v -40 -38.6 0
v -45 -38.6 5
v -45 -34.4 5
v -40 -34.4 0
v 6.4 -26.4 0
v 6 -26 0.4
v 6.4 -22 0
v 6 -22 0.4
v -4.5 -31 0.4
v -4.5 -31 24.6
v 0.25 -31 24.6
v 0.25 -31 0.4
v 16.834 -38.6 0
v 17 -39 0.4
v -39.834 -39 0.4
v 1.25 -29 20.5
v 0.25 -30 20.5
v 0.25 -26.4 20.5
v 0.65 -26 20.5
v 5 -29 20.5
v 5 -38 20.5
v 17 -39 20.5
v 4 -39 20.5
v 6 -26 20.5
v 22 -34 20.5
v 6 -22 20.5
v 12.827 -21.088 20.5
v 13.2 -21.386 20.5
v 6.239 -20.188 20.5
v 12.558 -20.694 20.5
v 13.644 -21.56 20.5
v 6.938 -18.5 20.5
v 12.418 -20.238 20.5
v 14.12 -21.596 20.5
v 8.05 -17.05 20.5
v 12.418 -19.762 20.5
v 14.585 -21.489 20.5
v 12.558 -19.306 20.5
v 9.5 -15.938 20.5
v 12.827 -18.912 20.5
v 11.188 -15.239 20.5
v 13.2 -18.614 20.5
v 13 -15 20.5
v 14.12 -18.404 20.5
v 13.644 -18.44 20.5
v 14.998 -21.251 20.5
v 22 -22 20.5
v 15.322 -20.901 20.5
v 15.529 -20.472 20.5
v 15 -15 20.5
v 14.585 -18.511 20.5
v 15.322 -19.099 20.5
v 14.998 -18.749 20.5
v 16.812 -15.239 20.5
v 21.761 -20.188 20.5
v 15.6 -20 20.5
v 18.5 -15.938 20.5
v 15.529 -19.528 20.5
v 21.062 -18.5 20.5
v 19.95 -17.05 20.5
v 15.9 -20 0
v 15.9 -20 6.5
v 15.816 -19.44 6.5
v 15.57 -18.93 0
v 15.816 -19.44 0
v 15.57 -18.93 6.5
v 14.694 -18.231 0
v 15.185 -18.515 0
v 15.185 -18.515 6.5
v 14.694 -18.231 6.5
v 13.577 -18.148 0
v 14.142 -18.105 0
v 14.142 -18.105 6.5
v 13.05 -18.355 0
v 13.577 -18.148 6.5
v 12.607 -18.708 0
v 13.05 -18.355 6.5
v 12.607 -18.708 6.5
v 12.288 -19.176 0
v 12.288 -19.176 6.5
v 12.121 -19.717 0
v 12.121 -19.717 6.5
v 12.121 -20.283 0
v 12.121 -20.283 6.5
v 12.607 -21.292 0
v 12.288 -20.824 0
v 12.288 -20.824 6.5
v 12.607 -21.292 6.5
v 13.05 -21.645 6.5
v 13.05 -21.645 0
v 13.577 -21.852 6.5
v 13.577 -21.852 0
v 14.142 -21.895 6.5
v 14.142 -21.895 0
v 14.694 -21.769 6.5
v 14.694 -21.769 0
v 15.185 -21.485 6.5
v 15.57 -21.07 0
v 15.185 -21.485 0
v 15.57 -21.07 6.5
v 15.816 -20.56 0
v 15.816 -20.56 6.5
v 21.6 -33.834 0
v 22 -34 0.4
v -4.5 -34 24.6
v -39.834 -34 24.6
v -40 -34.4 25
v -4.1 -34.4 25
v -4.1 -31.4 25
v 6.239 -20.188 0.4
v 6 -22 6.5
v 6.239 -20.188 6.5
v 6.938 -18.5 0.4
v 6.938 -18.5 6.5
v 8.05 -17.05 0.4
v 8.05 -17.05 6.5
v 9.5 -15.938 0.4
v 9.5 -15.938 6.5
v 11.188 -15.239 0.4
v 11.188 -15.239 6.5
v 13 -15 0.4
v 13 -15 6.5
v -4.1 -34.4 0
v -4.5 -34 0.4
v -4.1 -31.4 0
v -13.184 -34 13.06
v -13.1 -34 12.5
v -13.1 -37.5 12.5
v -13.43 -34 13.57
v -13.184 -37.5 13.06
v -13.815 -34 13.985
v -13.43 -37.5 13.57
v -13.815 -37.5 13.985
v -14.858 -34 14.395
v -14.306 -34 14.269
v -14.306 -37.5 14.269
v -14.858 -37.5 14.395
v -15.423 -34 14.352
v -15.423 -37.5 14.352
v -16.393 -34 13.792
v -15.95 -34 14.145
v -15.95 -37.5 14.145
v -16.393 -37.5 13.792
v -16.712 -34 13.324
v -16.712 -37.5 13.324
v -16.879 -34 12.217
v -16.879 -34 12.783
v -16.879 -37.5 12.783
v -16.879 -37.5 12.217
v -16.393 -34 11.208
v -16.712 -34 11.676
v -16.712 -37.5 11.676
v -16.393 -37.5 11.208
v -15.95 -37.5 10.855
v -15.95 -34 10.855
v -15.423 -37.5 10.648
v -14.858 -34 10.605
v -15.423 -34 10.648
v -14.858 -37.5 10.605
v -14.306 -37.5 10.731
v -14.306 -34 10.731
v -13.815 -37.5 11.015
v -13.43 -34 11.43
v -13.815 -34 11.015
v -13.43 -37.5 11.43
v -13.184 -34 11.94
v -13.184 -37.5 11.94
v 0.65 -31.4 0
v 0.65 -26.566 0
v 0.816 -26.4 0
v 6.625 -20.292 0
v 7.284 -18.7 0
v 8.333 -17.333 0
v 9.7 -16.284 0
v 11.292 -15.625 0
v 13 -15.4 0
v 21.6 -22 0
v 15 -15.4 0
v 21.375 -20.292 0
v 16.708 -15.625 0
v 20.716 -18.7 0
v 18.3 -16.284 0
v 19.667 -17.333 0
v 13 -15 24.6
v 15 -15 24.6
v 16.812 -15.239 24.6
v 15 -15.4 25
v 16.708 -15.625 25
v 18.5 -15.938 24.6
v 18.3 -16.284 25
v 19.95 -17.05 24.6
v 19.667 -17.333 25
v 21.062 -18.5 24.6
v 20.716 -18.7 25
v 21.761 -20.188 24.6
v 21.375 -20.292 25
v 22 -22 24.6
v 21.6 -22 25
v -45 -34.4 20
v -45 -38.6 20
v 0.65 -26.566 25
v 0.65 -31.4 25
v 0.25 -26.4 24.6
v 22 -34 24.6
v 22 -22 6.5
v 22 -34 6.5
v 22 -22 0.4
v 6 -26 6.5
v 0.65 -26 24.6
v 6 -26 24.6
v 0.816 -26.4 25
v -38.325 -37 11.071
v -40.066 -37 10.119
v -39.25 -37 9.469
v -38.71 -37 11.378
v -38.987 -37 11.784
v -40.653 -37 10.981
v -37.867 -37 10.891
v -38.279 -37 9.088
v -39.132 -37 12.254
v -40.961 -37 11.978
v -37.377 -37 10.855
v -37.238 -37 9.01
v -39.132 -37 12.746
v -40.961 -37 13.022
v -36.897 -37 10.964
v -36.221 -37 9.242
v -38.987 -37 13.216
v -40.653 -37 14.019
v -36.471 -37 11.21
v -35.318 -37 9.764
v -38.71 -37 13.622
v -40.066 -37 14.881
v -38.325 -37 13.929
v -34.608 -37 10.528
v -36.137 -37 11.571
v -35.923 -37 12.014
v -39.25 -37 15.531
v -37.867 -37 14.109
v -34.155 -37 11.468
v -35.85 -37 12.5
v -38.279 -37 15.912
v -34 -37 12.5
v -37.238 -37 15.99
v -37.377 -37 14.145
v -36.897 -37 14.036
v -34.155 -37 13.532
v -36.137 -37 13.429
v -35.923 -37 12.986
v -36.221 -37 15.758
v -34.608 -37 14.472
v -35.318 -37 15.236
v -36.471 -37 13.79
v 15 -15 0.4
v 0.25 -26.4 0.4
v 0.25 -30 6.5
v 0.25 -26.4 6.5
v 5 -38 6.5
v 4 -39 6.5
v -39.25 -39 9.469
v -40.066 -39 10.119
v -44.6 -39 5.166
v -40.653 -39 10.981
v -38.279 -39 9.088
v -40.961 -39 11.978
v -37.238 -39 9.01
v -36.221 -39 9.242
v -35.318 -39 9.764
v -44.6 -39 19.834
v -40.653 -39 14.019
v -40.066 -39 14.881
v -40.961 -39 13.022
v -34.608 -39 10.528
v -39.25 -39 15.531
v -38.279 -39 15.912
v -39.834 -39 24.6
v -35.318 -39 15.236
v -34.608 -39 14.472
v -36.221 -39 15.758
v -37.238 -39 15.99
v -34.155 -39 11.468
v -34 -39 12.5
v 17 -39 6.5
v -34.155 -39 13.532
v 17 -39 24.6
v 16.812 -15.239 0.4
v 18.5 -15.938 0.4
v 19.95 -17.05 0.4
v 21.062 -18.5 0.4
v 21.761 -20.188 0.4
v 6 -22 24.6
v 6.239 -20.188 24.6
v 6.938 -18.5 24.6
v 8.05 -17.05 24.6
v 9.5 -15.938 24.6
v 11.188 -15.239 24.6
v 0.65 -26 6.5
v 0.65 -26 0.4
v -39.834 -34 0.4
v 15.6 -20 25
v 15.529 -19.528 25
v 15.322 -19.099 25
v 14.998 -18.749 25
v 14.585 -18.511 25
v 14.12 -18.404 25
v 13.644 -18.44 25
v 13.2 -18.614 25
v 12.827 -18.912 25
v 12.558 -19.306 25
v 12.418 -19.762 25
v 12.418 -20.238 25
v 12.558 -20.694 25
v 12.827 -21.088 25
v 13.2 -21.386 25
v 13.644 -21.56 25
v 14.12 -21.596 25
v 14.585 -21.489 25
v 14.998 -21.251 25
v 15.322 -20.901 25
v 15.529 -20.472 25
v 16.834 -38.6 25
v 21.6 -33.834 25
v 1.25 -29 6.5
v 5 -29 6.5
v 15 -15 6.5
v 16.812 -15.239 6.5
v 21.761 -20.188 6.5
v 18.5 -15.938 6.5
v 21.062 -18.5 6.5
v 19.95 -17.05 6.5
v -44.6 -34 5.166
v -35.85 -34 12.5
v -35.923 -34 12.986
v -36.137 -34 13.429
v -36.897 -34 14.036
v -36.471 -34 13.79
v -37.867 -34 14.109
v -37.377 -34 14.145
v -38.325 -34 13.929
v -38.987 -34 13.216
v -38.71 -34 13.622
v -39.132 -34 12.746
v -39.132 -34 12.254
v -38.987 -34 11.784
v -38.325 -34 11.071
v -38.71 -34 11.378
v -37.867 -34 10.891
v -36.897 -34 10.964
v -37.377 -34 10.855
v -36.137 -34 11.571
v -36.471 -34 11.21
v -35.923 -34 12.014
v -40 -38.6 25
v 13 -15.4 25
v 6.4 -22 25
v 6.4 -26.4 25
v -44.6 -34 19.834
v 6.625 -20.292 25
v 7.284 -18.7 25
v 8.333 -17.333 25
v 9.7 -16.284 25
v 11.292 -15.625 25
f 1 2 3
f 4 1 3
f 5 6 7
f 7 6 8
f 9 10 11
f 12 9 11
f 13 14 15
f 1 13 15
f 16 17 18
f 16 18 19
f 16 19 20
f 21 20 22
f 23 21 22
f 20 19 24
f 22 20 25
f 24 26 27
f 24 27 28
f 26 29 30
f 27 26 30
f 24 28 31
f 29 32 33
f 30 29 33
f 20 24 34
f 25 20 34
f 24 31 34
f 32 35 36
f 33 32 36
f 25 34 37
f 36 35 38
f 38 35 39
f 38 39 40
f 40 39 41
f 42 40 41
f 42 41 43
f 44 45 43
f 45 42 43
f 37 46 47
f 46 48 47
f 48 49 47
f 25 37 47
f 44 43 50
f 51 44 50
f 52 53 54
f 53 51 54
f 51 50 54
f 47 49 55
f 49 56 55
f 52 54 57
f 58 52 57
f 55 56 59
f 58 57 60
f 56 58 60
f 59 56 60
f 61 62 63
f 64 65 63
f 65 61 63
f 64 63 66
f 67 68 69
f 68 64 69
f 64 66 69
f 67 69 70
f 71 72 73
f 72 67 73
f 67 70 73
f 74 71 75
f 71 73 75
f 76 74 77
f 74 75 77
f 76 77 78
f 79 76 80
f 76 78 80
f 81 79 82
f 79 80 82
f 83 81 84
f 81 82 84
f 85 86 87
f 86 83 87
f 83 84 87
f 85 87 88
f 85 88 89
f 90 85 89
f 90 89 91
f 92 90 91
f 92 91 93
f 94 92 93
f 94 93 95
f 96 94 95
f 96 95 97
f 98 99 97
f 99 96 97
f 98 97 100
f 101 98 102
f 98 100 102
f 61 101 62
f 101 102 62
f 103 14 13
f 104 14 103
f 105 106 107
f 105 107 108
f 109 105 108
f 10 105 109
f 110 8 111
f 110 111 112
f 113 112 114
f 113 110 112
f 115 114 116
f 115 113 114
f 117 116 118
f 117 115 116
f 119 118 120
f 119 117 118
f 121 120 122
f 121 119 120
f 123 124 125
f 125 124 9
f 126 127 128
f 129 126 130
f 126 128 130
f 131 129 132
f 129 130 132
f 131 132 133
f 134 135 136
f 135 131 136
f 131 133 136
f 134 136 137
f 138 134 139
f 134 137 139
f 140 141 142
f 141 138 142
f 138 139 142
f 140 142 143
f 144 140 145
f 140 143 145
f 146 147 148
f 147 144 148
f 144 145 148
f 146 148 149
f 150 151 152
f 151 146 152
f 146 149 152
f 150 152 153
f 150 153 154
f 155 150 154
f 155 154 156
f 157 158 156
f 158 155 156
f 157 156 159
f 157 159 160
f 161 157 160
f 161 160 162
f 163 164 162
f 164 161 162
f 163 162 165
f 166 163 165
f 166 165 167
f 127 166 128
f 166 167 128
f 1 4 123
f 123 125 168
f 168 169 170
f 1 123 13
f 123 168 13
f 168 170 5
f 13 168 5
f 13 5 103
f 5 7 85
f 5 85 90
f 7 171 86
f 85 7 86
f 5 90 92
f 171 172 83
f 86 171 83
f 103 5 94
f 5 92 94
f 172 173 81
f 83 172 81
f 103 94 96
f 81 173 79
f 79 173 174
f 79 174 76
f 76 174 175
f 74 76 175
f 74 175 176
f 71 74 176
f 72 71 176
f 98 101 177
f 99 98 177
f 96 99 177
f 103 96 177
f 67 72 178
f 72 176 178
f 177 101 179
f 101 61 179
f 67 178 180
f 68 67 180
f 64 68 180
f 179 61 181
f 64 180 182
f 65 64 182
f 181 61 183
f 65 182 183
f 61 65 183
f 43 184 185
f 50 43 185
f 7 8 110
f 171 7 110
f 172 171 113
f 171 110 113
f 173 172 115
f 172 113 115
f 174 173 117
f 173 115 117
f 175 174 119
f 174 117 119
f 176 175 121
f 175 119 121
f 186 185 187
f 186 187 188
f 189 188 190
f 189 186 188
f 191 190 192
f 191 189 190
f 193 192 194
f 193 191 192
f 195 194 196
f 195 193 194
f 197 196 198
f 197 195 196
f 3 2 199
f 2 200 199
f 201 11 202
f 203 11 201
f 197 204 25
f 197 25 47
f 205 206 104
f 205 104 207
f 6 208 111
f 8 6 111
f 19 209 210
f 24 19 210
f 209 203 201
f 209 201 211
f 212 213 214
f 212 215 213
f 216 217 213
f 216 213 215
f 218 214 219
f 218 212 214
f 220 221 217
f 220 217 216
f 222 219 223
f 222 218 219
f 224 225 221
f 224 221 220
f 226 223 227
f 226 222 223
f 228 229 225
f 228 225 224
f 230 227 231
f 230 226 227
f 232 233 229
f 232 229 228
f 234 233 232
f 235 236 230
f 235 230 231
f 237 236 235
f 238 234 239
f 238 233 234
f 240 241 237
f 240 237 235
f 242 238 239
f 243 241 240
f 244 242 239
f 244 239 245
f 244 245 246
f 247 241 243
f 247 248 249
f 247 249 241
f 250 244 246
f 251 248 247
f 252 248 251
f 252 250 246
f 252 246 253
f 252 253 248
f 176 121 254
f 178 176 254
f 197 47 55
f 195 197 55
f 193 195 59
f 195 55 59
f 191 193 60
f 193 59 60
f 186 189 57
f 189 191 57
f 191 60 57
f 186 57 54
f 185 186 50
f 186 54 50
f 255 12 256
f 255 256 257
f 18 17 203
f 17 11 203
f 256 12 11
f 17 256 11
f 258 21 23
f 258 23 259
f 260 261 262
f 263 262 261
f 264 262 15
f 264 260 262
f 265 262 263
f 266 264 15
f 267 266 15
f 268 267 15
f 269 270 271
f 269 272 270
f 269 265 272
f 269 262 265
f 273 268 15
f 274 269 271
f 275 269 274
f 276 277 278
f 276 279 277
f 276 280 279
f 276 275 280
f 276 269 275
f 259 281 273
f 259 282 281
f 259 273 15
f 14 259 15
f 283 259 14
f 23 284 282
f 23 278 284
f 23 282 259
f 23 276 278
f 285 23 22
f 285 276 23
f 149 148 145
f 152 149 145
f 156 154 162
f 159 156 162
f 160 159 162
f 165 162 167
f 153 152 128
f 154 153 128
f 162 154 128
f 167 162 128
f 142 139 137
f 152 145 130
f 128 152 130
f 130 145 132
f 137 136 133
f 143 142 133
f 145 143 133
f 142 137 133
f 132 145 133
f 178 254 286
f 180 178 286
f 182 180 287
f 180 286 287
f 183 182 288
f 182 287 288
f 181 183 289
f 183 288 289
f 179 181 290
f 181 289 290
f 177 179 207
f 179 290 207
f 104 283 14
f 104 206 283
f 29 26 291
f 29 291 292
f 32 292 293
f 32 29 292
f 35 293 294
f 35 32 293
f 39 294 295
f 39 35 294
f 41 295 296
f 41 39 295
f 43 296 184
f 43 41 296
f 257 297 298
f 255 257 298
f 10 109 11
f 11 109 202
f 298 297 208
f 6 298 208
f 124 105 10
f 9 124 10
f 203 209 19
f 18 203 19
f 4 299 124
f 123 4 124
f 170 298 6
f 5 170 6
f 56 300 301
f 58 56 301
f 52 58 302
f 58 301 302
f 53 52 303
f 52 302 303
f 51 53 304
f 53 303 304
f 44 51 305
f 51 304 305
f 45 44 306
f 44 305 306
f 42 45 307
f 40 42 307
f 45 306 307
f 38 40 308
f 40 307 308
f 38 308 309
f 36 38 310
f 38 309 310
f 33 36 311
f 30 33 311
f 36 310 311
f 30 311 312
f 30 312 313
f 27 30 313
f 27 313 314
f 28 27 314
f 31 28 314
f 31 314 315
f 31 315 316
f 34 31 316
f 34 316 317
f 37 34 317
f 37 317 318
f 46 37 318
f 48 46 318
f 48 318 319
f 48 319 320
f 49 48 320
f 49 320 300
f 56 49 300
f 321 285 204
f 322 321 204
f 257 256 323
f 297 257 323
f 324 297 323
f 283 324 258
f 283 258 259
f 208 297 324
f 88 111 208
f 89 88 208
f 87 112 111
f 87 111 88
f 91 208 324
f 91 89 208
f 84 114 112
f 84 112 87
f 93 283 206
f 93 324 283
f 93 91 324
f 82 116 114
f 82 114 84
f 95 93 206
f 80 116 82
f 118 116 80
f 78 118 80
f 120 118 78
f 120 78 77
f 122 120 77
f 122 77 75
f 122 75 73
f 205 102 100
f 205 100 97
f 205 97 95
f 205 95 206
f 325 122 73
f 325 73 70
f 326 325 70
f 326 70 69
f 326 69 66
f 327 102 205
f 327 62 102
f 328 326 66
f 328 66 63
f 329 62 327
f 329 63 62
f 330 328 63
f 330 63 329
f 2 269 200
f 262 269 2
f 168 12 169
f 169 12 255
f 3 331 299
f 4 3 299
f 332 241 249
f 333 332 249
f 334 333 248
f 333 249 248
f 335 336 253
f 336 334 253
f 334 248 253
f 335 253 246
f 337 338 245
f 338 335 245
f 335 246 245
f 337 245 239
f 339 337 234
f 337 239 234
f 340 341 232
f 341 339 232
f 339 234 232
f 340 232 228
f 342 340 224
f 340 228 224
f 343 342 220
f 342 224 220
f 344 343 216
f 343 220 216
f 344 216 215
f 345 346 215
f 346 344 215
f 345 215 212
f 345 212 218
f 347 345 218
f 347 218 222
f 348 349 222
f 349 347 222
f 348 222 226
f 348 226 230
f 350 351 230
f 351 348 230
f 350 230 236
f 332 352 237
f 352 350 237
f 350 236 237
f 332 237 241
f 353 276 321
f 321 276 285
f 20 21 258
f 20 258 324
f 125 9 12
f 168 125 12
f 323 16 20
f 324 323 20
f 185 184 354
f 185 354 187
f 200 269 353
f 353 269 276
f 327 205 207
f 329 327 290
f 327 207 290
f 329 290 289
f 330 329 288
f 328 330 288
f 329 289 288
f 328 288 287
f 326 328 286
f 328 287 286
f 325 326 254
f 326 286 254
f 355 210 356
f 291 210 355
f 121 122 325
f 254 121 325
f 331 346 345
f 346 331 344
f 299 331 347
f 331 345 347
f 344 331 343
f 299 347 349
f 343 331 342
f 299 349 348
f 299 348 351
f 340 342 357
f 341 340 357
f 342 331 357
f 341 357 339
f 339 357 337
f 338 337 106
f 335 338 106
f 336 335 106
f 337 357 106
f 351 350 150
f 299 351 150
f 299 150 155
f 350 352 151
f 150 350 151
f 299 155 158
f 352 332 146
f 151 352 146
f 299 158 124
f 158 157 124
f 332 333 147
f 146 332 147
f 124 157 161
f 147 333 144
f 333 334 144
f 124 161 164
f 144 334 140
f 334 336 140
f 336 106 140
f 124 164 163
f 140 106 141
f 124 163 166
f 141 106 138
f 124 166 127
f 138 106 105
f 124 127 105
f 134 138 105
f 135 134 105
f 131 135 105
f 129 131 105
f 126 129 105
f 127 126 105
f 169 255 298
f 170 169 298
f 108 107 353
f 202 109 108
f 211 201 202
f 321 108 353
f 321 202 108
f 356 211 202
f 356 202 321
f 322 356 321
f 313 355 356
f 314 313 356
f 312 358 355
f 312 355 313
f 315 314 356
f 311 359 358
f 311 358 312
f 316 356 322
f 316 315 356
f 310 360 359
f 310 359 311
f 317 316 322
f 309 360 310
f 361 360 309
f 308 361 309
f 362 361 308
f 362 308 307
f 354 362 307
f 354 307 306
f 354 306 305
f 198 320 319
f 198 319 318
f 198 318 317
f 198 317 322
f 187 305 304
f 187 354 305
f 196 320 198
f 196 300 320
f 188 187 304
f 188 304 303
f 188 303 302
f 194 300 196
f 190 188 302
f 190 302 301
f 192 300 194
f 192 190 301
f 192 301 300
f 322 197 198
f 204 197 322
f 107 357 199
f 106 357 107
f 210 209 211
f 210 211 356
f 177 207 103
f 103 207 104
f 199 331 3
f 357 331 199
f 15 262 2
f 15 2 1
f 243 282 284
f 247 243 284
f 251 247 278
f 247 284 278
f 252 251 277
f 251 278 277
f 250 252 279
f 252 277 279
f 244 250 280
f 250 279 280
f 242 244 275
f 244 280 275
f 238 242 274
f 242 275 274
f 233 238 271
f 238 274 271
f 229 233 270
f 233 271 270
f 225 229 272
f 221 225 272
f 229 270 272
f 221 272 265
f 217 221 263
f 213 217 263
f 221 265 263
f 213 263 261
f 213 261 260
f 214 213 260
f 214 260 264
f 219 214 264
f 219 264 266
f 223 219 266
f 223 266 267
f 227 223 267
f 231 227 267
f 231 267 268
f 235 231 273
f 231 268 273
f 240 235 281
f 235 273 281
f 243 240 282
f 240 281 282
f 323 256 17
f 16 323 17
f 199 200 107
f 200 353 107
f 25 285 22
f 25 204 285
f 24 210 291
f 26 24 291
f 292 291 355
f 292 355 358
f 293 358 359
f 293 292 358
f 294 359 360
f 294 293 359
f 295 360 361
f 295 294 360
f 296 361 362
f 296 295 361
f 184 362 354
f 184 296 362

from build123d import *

# Parameters (mm, degrees)
BOX044_W                                   = 19
BOX044_H                                   = 29
BOX044_DEPTH                               = 14
BOX043_W                                   = 23
BOX043_H                                   = 10
BOX043_DEPTH                               = 14
CYLINDER012_R                              = 1.9
CYLINDER012_DEPTH                          = 10
CYLINDER014_R                              = 3.5
CYLINDER014_DEPTH                          = 2
CYLINDER013_R                              = 1.65
CYLINDER013_DEPTH                          = 10
CYLINDER010_R                              = 1.6
CYLINDER010_DEPTH                          = 18
CYLINDER011_R                              = 1.9
CYLINDER011_DEPTH                          = 18
BOX015_W                                   = 5.75
BOX015_H                                   = 13
BOX015_DEPTH                               = 25
CHAMFER016016006_SIZE                      = 0.4
BOX009_W                                   = 16
BOX009_H                                   = 24
BOX009_DEPTH                               = 4.5
FILLET001_R                                = 7
CHAMFER011_SIZE                            = 5
BOX010_W                                   = 16
BOX010_H                                   = 24
BOX010_DEPTH                               = 6.5
FILLET002_R                                = 7
CHAMFER009_SIZE                            = 5
BOX012_W                                   = 43.5
BOX012_H                                   = 8
BOX012_DEPTH                               = 25
BOX008_W                                   = 52
BOX008_H                                   = 8
BOX008_DEPTH                               = 25
CHAMFER016016004_SIZE                      = 5
BOX011_W                                   = 21.75
BOX011_H                                   = 13
BOX011_DEPTH                               = 14
CHAMFER016016005_SIZE                      = 5
CHAMFER016016007_SIZE                      = 0.4
CHAMFER016016008004017002013005003_SIZE    = 1
CHAMFER016016008004017002013005004_SIZE    = 1
CHAMFER016016008004017002013005004002_SIZE = 0.4


with BuildPart() as cube044:
    # Box044 → Box044 (new body)
    with BuildSketch(Plane(origin=(5, -40.5, -20.5), x_dir=(1, 0, 0), z_dir=(0, 0, 1))):
        with Locations((9.5, 14.5)):
            Rectangle(BOX044_W, BOX044_H)
    extrude(amount=BOX044_DEPTH)


with BuildPart() as cube043:
    # Box043 → Box043 (new body)
    with BuildSketch(Plane(origin=(0, -29, -20.5), x_dir=(1, 0, 0), z_dir=(0, 0, 1))):
        with Locations((11.5, 5)):
            Rectangle(BOX043_W, BOX043_H)
    extrude(amount=BOX043_DEPTH)


with BuildPart() as cylinder012:
    # Cylinder012 → Cylinder012 (new body)
    with BuildSketch(Plane(origin=(-15, -37.5, -12.5), x_dir=(1, 0, 0), z_dir=(0, 1, 0))):
        Circle(CYLINDER012_R)
    extrude(amount=CYLINDER012_DEPTH)


with BuildPart() as cylinder014:
    # Cylinder014 → Cylinder014 (new body)
    with BuildSketch(Plane(origin=(-37.5, -39, -12.5), x_dir=(1, 0, 0), z_dir=(0, 1, 0))):
        Circle(CYLINDER014_R)
    extrude(amount=CYLINDER014_DEPTH)


with BuildPart() as fusion011:
    # Cylinder013 → Cylinder013 (new body)
    with BuildSketch(Plane(origin=(-37.5, -41.5, -12.5), x_dir=(1, 0, 0), z_dir=(0, 1, 0))):
        Circle(CYLINDER013_R)
    extrude(amount=CYLINDER013_DEPTH)

    # Fusion011: union Cylinder012, Cylinder014
    add(cylinder012.part)
    add(cylinder014.part)


with BuildPart() as cylinder010:
    # Cylinder010 → Cylinder010 (new body)
    with BuildSketch(Plane(origin=(10, -20, -30), x_dir=(1, 0, 0), z_dir=(0, 0, 1))):
        Circle(CYLINDER010_R)
    extrude(amount=CYLINDER010_DEPTH)


with BuildPart() as fusion010:
    # Cylinder011 → Cylinder011 (new body)
    with BuildSketch(Plane(origin=(10, -20, -11), x_dir=(1, 0, 0), z_dir=(0, 0, 1))):
        Circle(CYLINDER011_R)
    extrude(amount=CYLINDER011_DEPTH)

    # Fusion010: union Cylinder010
    add(cylinder010.part)


with BuildPart() as fusion010_1:
    # Fusion010 placement: moved
    add(fusion010.part.moved(Location((4, 0, 0))))


with BuildPart() as chamfer016016006:
    # Box015 → Box015 (new body)
    with BuildSketch(Plane(origin=(0.25, -39, -25), x_dir=(1, 0, 0), z_dir=(0, 0, 1))):
        with Locations((2.875, 6.5)):
            Rectangle(BOX015_W, BOX015_H)
    extrude(amount=BOX015_DEPTH)

    # Chamfer016016006
    chamfer016016006_edges = [chamfer016016006.edges().sort_by_distance(p)[0] for p in [
        (0.25, -26, -12.5),
    ]]
    chamfer(chamfer016016006_edges, length=CHAMFER016016006_SIZE)


with BuildPart() as chamfer011:
    # Box009 → Box009 (new body)
    with BuildSketch(Plane(origin=(2, -39, -25), x_dir=(1, 0, 0), z_dir=(0, 0, 1))):
        with Locations((8, 12)):
            Rectangle(BOX009_W, BOX009_H)
    extrude(amount=BOX009_DEPTH)

    # Fillet001
    fillet001_edges = [chamfer011.edges().sort_by_distance(p)[0] for p in [
        (2, -15, -22.75),
        (18, -15, -22.75),
    ]]
    fillet(fillet001_edges, radius=FILLET001_R)

    # Chamfer011
    chamfer011_edges = [chamfer011.edges().sort_by_distance(p)[0] for p in [
        (18, -39, -22.75),
    ]]
    chamfer(chamfer011_edges, length=CHAMFER011_SIZE)


with BuildPart() as chamfer011_1:
    # Chamfer011 placement: moved
    add(chamfer011.part.moved(Location((4, 0, 0))))


with BuildPart() as chamfer009:
    # Box010 → Box010 (new body)
    with BuildSketch(Plane(origin=(2, -39, -6.5), x_dir=(1, 0, 0), z_dir=(0, 0, 1))):
        with Locations((8, 12)):
            Rectangle(BOX010_W, BOX010_H)
    extrude(amount=BOX010_DEPTH)

    # Fillet002
    fillet002_edges = [chamfer009.edges().sort_by_distance(p)[0] for p in [
        (2, -15, -3.25),
        (18, -15, -3.25),
    ]]
    fillet(fillet002_edges, radius=FILLET002_R)

    # Chamfer009
    chamfer009_edges = [chamfer009.edges().sort_by_distance(p)[0] for p in [
        (18, -39, -3.25),
    ]]
    chamfer(chamfer009_edges, length=CHAMFER009_SIZE)


with BuildPart() as chamfer009_1:
    # Chamfer009 placement: moved
    add(chamfer009.part.moved(Location((4, 0, 0))))


with BuildPart() as cube012:
    # Box012 → Box012 (new body)
    with BuildSketch(Plane(origin=(-48, -34, -25), x_dir=(1, 0, 0), z_dir=(0, 0, 1))):
        with Locations((21.75, 4)):
            Rectangle(BOX012_W, BOX012_H)
    extrude(amount=BOX012_DEPTH)


with BuildPart() as chamfer016016004:
    # Box008 → Box008 (new body)
    with BuildSketch(Plane(origin=(-45, -39, -25), x_dir=(1, 0, 0), z_dir=(0, 0, 1))):
        with Locations((26, 4)):
            Rectangle(BOX008_W, BOX008_H)
    extrude(amount=BOX008_DEPTH)

    # Cut010011006: cut Cube012
    add(cube012.part, mode=Mode.SUBTRACT)

    # Chamfer016016004
    chamfer016016004_edges = [chamfer016016004.edges().sort_by_distance(p)[0] for p in [
        (-45, -36.5, 0),
        (-45, -36.5, -25),
    ]]
    chamfer(chamfer016016004_edges, length=CHAMFER016016004_SIZE)


with BuildPart() as chamfer016016008004017002013005004002:
    # Box011 → Box011 (new body)
    with BuildSketch(Plane(origin=(0.25, -39, -20.5), x_dir=(1, 0, 0), z_dir=(0, 0, 1))):
        with Locations((10.875, 6.5)):
            Rectangle(BOX011_W, BOX011_H)
    extrude(amount=BOX011_DEPTH)

    # Chamfer016016005
    chamfer016016005_edges = [chamfer016016008004017002013005004002.edges().sort_by_distance(p)[0] for p in [
        (22, -39, -13.5),
    ]]
    chamfer(chamfer016016005_edges, length=CHAMFER016016005_SIZE)

    # Chamfer016016007
    chamfer016016007_edges = [chamfer016016008004017002013005004002.edges().sort_by_distance(p)[0] for p in [
        (0.25, -26, -13.5),
    ]]
    chamfer(chamfer016016007_edges, length=CHAMFER016016007_SIZE)

    # Fusion017: union Chamfer016016006, Chamfer011, Chamfer009, Chamfer016016004
    add(chamfer016016006.part)
    add(chamfer011_1.part)
    add(chamfer009_1.part)
    add(chamfer016016004.part)

    # Cut010011007: cut Fusion010
    add(fusion010_1.part, mode=Mode.SUBTRACT)

    # Cut010011008: cut Fusion011
    add(fusion011.part, mode=Mode.SUBTRACT)

    # Cut010011008009003016026002: cut Cube043
    add(cube043.part, mode=Mode.SUBTRACT)

    # Chamfer016016008004017002013005003
    chamfer016016008004017002013005003_edges = [chamfer016016008004017002013005004002.edges().sort_by_distance(p)[0] for p in [
        (22, -29, -13.5),
        (0.25, -29, -13.5),
    ]]
    chamfer(chamfer016016008004017002013005003_edges, length=CHAMFER016016008004017002013005003_SIZE)

    # Cut010011008009003016026003: cut Cube044
    add(cube044.part, mode=Mode.SUBTRACT)

    # Chamfer016016008004017002013005004
    chamfer016016008004017002013005004_edges = [chamfer016016008004017002013005004002.edges().sort_by_distance(p)[0] for p in [
        (5, -39, -13.5),
    ]]
    chamfer(chamfer016016008004017002013005004_edges, length=CHAMFER016016008004017002013005004_SIZE)

    # Chamfer016016008004017002013005004002
    chamfer016016008004017002013005004002_edges = [chamfer016016008004017002013005004002.edges().sort_by_distance(p)[0] for p in [
        (3.325, -26, -25),
        (0.45, -26.2, -25),
        (6, -24, -25),
        (8.050253, -17.050253, -25),
        (14, -15, -25),
        (22, -28, -25),
        (19.5, -36.5, -25),
        (19.949747, -17.050253, -25),
        (-11.5, -39, 0),
        (-42.5, -39, -2.5),
        (-45, -39, -12.5),
        (-42.5, -39, -22.5),
        (-11.5, -39, -25),
        (3.325, -26, 0),
        (0.45, -26.2, 0),
        (6, -24, 0),
        (8.050253, -17.050253, 0),
        (14, -15, 0),
        (22, -28, 0),
        (19.5, -36.5, 0),
        (19.949747, -17.050253, 0),
        (-2.125, -31, -25),
        (-2.125, -31, 0),
        (-4.5, -32.5, 0),
        (-4.5, -32.5, -25),
        (-42.5, -34, -22.5),
        (-45, -34, -12.5),
        (-42.5, -34, -2.5),
        (-22.25, -34, -25),
        (-22.25, -34, 0),
        (0.25, -28.7, -25),
        (0.25, -28.7, 0),
    ]]
    chamfer(chamfer016016008004017002013005004002_edges, length=CHAMFER016016008004017002013005004002_SIZE)


with BuildPart() as part_mirroring002:
    # Part__Mirroring002: instance of Chamfer016016008004017002013005004002
    add(chamfer016016008004017002013005004002.part.mirror(Plane(origin=(0, 0, 0), x_dir=(0, 1, 0), z_dir=(0, 0, 1))))


solid = part_mirroring002.part
